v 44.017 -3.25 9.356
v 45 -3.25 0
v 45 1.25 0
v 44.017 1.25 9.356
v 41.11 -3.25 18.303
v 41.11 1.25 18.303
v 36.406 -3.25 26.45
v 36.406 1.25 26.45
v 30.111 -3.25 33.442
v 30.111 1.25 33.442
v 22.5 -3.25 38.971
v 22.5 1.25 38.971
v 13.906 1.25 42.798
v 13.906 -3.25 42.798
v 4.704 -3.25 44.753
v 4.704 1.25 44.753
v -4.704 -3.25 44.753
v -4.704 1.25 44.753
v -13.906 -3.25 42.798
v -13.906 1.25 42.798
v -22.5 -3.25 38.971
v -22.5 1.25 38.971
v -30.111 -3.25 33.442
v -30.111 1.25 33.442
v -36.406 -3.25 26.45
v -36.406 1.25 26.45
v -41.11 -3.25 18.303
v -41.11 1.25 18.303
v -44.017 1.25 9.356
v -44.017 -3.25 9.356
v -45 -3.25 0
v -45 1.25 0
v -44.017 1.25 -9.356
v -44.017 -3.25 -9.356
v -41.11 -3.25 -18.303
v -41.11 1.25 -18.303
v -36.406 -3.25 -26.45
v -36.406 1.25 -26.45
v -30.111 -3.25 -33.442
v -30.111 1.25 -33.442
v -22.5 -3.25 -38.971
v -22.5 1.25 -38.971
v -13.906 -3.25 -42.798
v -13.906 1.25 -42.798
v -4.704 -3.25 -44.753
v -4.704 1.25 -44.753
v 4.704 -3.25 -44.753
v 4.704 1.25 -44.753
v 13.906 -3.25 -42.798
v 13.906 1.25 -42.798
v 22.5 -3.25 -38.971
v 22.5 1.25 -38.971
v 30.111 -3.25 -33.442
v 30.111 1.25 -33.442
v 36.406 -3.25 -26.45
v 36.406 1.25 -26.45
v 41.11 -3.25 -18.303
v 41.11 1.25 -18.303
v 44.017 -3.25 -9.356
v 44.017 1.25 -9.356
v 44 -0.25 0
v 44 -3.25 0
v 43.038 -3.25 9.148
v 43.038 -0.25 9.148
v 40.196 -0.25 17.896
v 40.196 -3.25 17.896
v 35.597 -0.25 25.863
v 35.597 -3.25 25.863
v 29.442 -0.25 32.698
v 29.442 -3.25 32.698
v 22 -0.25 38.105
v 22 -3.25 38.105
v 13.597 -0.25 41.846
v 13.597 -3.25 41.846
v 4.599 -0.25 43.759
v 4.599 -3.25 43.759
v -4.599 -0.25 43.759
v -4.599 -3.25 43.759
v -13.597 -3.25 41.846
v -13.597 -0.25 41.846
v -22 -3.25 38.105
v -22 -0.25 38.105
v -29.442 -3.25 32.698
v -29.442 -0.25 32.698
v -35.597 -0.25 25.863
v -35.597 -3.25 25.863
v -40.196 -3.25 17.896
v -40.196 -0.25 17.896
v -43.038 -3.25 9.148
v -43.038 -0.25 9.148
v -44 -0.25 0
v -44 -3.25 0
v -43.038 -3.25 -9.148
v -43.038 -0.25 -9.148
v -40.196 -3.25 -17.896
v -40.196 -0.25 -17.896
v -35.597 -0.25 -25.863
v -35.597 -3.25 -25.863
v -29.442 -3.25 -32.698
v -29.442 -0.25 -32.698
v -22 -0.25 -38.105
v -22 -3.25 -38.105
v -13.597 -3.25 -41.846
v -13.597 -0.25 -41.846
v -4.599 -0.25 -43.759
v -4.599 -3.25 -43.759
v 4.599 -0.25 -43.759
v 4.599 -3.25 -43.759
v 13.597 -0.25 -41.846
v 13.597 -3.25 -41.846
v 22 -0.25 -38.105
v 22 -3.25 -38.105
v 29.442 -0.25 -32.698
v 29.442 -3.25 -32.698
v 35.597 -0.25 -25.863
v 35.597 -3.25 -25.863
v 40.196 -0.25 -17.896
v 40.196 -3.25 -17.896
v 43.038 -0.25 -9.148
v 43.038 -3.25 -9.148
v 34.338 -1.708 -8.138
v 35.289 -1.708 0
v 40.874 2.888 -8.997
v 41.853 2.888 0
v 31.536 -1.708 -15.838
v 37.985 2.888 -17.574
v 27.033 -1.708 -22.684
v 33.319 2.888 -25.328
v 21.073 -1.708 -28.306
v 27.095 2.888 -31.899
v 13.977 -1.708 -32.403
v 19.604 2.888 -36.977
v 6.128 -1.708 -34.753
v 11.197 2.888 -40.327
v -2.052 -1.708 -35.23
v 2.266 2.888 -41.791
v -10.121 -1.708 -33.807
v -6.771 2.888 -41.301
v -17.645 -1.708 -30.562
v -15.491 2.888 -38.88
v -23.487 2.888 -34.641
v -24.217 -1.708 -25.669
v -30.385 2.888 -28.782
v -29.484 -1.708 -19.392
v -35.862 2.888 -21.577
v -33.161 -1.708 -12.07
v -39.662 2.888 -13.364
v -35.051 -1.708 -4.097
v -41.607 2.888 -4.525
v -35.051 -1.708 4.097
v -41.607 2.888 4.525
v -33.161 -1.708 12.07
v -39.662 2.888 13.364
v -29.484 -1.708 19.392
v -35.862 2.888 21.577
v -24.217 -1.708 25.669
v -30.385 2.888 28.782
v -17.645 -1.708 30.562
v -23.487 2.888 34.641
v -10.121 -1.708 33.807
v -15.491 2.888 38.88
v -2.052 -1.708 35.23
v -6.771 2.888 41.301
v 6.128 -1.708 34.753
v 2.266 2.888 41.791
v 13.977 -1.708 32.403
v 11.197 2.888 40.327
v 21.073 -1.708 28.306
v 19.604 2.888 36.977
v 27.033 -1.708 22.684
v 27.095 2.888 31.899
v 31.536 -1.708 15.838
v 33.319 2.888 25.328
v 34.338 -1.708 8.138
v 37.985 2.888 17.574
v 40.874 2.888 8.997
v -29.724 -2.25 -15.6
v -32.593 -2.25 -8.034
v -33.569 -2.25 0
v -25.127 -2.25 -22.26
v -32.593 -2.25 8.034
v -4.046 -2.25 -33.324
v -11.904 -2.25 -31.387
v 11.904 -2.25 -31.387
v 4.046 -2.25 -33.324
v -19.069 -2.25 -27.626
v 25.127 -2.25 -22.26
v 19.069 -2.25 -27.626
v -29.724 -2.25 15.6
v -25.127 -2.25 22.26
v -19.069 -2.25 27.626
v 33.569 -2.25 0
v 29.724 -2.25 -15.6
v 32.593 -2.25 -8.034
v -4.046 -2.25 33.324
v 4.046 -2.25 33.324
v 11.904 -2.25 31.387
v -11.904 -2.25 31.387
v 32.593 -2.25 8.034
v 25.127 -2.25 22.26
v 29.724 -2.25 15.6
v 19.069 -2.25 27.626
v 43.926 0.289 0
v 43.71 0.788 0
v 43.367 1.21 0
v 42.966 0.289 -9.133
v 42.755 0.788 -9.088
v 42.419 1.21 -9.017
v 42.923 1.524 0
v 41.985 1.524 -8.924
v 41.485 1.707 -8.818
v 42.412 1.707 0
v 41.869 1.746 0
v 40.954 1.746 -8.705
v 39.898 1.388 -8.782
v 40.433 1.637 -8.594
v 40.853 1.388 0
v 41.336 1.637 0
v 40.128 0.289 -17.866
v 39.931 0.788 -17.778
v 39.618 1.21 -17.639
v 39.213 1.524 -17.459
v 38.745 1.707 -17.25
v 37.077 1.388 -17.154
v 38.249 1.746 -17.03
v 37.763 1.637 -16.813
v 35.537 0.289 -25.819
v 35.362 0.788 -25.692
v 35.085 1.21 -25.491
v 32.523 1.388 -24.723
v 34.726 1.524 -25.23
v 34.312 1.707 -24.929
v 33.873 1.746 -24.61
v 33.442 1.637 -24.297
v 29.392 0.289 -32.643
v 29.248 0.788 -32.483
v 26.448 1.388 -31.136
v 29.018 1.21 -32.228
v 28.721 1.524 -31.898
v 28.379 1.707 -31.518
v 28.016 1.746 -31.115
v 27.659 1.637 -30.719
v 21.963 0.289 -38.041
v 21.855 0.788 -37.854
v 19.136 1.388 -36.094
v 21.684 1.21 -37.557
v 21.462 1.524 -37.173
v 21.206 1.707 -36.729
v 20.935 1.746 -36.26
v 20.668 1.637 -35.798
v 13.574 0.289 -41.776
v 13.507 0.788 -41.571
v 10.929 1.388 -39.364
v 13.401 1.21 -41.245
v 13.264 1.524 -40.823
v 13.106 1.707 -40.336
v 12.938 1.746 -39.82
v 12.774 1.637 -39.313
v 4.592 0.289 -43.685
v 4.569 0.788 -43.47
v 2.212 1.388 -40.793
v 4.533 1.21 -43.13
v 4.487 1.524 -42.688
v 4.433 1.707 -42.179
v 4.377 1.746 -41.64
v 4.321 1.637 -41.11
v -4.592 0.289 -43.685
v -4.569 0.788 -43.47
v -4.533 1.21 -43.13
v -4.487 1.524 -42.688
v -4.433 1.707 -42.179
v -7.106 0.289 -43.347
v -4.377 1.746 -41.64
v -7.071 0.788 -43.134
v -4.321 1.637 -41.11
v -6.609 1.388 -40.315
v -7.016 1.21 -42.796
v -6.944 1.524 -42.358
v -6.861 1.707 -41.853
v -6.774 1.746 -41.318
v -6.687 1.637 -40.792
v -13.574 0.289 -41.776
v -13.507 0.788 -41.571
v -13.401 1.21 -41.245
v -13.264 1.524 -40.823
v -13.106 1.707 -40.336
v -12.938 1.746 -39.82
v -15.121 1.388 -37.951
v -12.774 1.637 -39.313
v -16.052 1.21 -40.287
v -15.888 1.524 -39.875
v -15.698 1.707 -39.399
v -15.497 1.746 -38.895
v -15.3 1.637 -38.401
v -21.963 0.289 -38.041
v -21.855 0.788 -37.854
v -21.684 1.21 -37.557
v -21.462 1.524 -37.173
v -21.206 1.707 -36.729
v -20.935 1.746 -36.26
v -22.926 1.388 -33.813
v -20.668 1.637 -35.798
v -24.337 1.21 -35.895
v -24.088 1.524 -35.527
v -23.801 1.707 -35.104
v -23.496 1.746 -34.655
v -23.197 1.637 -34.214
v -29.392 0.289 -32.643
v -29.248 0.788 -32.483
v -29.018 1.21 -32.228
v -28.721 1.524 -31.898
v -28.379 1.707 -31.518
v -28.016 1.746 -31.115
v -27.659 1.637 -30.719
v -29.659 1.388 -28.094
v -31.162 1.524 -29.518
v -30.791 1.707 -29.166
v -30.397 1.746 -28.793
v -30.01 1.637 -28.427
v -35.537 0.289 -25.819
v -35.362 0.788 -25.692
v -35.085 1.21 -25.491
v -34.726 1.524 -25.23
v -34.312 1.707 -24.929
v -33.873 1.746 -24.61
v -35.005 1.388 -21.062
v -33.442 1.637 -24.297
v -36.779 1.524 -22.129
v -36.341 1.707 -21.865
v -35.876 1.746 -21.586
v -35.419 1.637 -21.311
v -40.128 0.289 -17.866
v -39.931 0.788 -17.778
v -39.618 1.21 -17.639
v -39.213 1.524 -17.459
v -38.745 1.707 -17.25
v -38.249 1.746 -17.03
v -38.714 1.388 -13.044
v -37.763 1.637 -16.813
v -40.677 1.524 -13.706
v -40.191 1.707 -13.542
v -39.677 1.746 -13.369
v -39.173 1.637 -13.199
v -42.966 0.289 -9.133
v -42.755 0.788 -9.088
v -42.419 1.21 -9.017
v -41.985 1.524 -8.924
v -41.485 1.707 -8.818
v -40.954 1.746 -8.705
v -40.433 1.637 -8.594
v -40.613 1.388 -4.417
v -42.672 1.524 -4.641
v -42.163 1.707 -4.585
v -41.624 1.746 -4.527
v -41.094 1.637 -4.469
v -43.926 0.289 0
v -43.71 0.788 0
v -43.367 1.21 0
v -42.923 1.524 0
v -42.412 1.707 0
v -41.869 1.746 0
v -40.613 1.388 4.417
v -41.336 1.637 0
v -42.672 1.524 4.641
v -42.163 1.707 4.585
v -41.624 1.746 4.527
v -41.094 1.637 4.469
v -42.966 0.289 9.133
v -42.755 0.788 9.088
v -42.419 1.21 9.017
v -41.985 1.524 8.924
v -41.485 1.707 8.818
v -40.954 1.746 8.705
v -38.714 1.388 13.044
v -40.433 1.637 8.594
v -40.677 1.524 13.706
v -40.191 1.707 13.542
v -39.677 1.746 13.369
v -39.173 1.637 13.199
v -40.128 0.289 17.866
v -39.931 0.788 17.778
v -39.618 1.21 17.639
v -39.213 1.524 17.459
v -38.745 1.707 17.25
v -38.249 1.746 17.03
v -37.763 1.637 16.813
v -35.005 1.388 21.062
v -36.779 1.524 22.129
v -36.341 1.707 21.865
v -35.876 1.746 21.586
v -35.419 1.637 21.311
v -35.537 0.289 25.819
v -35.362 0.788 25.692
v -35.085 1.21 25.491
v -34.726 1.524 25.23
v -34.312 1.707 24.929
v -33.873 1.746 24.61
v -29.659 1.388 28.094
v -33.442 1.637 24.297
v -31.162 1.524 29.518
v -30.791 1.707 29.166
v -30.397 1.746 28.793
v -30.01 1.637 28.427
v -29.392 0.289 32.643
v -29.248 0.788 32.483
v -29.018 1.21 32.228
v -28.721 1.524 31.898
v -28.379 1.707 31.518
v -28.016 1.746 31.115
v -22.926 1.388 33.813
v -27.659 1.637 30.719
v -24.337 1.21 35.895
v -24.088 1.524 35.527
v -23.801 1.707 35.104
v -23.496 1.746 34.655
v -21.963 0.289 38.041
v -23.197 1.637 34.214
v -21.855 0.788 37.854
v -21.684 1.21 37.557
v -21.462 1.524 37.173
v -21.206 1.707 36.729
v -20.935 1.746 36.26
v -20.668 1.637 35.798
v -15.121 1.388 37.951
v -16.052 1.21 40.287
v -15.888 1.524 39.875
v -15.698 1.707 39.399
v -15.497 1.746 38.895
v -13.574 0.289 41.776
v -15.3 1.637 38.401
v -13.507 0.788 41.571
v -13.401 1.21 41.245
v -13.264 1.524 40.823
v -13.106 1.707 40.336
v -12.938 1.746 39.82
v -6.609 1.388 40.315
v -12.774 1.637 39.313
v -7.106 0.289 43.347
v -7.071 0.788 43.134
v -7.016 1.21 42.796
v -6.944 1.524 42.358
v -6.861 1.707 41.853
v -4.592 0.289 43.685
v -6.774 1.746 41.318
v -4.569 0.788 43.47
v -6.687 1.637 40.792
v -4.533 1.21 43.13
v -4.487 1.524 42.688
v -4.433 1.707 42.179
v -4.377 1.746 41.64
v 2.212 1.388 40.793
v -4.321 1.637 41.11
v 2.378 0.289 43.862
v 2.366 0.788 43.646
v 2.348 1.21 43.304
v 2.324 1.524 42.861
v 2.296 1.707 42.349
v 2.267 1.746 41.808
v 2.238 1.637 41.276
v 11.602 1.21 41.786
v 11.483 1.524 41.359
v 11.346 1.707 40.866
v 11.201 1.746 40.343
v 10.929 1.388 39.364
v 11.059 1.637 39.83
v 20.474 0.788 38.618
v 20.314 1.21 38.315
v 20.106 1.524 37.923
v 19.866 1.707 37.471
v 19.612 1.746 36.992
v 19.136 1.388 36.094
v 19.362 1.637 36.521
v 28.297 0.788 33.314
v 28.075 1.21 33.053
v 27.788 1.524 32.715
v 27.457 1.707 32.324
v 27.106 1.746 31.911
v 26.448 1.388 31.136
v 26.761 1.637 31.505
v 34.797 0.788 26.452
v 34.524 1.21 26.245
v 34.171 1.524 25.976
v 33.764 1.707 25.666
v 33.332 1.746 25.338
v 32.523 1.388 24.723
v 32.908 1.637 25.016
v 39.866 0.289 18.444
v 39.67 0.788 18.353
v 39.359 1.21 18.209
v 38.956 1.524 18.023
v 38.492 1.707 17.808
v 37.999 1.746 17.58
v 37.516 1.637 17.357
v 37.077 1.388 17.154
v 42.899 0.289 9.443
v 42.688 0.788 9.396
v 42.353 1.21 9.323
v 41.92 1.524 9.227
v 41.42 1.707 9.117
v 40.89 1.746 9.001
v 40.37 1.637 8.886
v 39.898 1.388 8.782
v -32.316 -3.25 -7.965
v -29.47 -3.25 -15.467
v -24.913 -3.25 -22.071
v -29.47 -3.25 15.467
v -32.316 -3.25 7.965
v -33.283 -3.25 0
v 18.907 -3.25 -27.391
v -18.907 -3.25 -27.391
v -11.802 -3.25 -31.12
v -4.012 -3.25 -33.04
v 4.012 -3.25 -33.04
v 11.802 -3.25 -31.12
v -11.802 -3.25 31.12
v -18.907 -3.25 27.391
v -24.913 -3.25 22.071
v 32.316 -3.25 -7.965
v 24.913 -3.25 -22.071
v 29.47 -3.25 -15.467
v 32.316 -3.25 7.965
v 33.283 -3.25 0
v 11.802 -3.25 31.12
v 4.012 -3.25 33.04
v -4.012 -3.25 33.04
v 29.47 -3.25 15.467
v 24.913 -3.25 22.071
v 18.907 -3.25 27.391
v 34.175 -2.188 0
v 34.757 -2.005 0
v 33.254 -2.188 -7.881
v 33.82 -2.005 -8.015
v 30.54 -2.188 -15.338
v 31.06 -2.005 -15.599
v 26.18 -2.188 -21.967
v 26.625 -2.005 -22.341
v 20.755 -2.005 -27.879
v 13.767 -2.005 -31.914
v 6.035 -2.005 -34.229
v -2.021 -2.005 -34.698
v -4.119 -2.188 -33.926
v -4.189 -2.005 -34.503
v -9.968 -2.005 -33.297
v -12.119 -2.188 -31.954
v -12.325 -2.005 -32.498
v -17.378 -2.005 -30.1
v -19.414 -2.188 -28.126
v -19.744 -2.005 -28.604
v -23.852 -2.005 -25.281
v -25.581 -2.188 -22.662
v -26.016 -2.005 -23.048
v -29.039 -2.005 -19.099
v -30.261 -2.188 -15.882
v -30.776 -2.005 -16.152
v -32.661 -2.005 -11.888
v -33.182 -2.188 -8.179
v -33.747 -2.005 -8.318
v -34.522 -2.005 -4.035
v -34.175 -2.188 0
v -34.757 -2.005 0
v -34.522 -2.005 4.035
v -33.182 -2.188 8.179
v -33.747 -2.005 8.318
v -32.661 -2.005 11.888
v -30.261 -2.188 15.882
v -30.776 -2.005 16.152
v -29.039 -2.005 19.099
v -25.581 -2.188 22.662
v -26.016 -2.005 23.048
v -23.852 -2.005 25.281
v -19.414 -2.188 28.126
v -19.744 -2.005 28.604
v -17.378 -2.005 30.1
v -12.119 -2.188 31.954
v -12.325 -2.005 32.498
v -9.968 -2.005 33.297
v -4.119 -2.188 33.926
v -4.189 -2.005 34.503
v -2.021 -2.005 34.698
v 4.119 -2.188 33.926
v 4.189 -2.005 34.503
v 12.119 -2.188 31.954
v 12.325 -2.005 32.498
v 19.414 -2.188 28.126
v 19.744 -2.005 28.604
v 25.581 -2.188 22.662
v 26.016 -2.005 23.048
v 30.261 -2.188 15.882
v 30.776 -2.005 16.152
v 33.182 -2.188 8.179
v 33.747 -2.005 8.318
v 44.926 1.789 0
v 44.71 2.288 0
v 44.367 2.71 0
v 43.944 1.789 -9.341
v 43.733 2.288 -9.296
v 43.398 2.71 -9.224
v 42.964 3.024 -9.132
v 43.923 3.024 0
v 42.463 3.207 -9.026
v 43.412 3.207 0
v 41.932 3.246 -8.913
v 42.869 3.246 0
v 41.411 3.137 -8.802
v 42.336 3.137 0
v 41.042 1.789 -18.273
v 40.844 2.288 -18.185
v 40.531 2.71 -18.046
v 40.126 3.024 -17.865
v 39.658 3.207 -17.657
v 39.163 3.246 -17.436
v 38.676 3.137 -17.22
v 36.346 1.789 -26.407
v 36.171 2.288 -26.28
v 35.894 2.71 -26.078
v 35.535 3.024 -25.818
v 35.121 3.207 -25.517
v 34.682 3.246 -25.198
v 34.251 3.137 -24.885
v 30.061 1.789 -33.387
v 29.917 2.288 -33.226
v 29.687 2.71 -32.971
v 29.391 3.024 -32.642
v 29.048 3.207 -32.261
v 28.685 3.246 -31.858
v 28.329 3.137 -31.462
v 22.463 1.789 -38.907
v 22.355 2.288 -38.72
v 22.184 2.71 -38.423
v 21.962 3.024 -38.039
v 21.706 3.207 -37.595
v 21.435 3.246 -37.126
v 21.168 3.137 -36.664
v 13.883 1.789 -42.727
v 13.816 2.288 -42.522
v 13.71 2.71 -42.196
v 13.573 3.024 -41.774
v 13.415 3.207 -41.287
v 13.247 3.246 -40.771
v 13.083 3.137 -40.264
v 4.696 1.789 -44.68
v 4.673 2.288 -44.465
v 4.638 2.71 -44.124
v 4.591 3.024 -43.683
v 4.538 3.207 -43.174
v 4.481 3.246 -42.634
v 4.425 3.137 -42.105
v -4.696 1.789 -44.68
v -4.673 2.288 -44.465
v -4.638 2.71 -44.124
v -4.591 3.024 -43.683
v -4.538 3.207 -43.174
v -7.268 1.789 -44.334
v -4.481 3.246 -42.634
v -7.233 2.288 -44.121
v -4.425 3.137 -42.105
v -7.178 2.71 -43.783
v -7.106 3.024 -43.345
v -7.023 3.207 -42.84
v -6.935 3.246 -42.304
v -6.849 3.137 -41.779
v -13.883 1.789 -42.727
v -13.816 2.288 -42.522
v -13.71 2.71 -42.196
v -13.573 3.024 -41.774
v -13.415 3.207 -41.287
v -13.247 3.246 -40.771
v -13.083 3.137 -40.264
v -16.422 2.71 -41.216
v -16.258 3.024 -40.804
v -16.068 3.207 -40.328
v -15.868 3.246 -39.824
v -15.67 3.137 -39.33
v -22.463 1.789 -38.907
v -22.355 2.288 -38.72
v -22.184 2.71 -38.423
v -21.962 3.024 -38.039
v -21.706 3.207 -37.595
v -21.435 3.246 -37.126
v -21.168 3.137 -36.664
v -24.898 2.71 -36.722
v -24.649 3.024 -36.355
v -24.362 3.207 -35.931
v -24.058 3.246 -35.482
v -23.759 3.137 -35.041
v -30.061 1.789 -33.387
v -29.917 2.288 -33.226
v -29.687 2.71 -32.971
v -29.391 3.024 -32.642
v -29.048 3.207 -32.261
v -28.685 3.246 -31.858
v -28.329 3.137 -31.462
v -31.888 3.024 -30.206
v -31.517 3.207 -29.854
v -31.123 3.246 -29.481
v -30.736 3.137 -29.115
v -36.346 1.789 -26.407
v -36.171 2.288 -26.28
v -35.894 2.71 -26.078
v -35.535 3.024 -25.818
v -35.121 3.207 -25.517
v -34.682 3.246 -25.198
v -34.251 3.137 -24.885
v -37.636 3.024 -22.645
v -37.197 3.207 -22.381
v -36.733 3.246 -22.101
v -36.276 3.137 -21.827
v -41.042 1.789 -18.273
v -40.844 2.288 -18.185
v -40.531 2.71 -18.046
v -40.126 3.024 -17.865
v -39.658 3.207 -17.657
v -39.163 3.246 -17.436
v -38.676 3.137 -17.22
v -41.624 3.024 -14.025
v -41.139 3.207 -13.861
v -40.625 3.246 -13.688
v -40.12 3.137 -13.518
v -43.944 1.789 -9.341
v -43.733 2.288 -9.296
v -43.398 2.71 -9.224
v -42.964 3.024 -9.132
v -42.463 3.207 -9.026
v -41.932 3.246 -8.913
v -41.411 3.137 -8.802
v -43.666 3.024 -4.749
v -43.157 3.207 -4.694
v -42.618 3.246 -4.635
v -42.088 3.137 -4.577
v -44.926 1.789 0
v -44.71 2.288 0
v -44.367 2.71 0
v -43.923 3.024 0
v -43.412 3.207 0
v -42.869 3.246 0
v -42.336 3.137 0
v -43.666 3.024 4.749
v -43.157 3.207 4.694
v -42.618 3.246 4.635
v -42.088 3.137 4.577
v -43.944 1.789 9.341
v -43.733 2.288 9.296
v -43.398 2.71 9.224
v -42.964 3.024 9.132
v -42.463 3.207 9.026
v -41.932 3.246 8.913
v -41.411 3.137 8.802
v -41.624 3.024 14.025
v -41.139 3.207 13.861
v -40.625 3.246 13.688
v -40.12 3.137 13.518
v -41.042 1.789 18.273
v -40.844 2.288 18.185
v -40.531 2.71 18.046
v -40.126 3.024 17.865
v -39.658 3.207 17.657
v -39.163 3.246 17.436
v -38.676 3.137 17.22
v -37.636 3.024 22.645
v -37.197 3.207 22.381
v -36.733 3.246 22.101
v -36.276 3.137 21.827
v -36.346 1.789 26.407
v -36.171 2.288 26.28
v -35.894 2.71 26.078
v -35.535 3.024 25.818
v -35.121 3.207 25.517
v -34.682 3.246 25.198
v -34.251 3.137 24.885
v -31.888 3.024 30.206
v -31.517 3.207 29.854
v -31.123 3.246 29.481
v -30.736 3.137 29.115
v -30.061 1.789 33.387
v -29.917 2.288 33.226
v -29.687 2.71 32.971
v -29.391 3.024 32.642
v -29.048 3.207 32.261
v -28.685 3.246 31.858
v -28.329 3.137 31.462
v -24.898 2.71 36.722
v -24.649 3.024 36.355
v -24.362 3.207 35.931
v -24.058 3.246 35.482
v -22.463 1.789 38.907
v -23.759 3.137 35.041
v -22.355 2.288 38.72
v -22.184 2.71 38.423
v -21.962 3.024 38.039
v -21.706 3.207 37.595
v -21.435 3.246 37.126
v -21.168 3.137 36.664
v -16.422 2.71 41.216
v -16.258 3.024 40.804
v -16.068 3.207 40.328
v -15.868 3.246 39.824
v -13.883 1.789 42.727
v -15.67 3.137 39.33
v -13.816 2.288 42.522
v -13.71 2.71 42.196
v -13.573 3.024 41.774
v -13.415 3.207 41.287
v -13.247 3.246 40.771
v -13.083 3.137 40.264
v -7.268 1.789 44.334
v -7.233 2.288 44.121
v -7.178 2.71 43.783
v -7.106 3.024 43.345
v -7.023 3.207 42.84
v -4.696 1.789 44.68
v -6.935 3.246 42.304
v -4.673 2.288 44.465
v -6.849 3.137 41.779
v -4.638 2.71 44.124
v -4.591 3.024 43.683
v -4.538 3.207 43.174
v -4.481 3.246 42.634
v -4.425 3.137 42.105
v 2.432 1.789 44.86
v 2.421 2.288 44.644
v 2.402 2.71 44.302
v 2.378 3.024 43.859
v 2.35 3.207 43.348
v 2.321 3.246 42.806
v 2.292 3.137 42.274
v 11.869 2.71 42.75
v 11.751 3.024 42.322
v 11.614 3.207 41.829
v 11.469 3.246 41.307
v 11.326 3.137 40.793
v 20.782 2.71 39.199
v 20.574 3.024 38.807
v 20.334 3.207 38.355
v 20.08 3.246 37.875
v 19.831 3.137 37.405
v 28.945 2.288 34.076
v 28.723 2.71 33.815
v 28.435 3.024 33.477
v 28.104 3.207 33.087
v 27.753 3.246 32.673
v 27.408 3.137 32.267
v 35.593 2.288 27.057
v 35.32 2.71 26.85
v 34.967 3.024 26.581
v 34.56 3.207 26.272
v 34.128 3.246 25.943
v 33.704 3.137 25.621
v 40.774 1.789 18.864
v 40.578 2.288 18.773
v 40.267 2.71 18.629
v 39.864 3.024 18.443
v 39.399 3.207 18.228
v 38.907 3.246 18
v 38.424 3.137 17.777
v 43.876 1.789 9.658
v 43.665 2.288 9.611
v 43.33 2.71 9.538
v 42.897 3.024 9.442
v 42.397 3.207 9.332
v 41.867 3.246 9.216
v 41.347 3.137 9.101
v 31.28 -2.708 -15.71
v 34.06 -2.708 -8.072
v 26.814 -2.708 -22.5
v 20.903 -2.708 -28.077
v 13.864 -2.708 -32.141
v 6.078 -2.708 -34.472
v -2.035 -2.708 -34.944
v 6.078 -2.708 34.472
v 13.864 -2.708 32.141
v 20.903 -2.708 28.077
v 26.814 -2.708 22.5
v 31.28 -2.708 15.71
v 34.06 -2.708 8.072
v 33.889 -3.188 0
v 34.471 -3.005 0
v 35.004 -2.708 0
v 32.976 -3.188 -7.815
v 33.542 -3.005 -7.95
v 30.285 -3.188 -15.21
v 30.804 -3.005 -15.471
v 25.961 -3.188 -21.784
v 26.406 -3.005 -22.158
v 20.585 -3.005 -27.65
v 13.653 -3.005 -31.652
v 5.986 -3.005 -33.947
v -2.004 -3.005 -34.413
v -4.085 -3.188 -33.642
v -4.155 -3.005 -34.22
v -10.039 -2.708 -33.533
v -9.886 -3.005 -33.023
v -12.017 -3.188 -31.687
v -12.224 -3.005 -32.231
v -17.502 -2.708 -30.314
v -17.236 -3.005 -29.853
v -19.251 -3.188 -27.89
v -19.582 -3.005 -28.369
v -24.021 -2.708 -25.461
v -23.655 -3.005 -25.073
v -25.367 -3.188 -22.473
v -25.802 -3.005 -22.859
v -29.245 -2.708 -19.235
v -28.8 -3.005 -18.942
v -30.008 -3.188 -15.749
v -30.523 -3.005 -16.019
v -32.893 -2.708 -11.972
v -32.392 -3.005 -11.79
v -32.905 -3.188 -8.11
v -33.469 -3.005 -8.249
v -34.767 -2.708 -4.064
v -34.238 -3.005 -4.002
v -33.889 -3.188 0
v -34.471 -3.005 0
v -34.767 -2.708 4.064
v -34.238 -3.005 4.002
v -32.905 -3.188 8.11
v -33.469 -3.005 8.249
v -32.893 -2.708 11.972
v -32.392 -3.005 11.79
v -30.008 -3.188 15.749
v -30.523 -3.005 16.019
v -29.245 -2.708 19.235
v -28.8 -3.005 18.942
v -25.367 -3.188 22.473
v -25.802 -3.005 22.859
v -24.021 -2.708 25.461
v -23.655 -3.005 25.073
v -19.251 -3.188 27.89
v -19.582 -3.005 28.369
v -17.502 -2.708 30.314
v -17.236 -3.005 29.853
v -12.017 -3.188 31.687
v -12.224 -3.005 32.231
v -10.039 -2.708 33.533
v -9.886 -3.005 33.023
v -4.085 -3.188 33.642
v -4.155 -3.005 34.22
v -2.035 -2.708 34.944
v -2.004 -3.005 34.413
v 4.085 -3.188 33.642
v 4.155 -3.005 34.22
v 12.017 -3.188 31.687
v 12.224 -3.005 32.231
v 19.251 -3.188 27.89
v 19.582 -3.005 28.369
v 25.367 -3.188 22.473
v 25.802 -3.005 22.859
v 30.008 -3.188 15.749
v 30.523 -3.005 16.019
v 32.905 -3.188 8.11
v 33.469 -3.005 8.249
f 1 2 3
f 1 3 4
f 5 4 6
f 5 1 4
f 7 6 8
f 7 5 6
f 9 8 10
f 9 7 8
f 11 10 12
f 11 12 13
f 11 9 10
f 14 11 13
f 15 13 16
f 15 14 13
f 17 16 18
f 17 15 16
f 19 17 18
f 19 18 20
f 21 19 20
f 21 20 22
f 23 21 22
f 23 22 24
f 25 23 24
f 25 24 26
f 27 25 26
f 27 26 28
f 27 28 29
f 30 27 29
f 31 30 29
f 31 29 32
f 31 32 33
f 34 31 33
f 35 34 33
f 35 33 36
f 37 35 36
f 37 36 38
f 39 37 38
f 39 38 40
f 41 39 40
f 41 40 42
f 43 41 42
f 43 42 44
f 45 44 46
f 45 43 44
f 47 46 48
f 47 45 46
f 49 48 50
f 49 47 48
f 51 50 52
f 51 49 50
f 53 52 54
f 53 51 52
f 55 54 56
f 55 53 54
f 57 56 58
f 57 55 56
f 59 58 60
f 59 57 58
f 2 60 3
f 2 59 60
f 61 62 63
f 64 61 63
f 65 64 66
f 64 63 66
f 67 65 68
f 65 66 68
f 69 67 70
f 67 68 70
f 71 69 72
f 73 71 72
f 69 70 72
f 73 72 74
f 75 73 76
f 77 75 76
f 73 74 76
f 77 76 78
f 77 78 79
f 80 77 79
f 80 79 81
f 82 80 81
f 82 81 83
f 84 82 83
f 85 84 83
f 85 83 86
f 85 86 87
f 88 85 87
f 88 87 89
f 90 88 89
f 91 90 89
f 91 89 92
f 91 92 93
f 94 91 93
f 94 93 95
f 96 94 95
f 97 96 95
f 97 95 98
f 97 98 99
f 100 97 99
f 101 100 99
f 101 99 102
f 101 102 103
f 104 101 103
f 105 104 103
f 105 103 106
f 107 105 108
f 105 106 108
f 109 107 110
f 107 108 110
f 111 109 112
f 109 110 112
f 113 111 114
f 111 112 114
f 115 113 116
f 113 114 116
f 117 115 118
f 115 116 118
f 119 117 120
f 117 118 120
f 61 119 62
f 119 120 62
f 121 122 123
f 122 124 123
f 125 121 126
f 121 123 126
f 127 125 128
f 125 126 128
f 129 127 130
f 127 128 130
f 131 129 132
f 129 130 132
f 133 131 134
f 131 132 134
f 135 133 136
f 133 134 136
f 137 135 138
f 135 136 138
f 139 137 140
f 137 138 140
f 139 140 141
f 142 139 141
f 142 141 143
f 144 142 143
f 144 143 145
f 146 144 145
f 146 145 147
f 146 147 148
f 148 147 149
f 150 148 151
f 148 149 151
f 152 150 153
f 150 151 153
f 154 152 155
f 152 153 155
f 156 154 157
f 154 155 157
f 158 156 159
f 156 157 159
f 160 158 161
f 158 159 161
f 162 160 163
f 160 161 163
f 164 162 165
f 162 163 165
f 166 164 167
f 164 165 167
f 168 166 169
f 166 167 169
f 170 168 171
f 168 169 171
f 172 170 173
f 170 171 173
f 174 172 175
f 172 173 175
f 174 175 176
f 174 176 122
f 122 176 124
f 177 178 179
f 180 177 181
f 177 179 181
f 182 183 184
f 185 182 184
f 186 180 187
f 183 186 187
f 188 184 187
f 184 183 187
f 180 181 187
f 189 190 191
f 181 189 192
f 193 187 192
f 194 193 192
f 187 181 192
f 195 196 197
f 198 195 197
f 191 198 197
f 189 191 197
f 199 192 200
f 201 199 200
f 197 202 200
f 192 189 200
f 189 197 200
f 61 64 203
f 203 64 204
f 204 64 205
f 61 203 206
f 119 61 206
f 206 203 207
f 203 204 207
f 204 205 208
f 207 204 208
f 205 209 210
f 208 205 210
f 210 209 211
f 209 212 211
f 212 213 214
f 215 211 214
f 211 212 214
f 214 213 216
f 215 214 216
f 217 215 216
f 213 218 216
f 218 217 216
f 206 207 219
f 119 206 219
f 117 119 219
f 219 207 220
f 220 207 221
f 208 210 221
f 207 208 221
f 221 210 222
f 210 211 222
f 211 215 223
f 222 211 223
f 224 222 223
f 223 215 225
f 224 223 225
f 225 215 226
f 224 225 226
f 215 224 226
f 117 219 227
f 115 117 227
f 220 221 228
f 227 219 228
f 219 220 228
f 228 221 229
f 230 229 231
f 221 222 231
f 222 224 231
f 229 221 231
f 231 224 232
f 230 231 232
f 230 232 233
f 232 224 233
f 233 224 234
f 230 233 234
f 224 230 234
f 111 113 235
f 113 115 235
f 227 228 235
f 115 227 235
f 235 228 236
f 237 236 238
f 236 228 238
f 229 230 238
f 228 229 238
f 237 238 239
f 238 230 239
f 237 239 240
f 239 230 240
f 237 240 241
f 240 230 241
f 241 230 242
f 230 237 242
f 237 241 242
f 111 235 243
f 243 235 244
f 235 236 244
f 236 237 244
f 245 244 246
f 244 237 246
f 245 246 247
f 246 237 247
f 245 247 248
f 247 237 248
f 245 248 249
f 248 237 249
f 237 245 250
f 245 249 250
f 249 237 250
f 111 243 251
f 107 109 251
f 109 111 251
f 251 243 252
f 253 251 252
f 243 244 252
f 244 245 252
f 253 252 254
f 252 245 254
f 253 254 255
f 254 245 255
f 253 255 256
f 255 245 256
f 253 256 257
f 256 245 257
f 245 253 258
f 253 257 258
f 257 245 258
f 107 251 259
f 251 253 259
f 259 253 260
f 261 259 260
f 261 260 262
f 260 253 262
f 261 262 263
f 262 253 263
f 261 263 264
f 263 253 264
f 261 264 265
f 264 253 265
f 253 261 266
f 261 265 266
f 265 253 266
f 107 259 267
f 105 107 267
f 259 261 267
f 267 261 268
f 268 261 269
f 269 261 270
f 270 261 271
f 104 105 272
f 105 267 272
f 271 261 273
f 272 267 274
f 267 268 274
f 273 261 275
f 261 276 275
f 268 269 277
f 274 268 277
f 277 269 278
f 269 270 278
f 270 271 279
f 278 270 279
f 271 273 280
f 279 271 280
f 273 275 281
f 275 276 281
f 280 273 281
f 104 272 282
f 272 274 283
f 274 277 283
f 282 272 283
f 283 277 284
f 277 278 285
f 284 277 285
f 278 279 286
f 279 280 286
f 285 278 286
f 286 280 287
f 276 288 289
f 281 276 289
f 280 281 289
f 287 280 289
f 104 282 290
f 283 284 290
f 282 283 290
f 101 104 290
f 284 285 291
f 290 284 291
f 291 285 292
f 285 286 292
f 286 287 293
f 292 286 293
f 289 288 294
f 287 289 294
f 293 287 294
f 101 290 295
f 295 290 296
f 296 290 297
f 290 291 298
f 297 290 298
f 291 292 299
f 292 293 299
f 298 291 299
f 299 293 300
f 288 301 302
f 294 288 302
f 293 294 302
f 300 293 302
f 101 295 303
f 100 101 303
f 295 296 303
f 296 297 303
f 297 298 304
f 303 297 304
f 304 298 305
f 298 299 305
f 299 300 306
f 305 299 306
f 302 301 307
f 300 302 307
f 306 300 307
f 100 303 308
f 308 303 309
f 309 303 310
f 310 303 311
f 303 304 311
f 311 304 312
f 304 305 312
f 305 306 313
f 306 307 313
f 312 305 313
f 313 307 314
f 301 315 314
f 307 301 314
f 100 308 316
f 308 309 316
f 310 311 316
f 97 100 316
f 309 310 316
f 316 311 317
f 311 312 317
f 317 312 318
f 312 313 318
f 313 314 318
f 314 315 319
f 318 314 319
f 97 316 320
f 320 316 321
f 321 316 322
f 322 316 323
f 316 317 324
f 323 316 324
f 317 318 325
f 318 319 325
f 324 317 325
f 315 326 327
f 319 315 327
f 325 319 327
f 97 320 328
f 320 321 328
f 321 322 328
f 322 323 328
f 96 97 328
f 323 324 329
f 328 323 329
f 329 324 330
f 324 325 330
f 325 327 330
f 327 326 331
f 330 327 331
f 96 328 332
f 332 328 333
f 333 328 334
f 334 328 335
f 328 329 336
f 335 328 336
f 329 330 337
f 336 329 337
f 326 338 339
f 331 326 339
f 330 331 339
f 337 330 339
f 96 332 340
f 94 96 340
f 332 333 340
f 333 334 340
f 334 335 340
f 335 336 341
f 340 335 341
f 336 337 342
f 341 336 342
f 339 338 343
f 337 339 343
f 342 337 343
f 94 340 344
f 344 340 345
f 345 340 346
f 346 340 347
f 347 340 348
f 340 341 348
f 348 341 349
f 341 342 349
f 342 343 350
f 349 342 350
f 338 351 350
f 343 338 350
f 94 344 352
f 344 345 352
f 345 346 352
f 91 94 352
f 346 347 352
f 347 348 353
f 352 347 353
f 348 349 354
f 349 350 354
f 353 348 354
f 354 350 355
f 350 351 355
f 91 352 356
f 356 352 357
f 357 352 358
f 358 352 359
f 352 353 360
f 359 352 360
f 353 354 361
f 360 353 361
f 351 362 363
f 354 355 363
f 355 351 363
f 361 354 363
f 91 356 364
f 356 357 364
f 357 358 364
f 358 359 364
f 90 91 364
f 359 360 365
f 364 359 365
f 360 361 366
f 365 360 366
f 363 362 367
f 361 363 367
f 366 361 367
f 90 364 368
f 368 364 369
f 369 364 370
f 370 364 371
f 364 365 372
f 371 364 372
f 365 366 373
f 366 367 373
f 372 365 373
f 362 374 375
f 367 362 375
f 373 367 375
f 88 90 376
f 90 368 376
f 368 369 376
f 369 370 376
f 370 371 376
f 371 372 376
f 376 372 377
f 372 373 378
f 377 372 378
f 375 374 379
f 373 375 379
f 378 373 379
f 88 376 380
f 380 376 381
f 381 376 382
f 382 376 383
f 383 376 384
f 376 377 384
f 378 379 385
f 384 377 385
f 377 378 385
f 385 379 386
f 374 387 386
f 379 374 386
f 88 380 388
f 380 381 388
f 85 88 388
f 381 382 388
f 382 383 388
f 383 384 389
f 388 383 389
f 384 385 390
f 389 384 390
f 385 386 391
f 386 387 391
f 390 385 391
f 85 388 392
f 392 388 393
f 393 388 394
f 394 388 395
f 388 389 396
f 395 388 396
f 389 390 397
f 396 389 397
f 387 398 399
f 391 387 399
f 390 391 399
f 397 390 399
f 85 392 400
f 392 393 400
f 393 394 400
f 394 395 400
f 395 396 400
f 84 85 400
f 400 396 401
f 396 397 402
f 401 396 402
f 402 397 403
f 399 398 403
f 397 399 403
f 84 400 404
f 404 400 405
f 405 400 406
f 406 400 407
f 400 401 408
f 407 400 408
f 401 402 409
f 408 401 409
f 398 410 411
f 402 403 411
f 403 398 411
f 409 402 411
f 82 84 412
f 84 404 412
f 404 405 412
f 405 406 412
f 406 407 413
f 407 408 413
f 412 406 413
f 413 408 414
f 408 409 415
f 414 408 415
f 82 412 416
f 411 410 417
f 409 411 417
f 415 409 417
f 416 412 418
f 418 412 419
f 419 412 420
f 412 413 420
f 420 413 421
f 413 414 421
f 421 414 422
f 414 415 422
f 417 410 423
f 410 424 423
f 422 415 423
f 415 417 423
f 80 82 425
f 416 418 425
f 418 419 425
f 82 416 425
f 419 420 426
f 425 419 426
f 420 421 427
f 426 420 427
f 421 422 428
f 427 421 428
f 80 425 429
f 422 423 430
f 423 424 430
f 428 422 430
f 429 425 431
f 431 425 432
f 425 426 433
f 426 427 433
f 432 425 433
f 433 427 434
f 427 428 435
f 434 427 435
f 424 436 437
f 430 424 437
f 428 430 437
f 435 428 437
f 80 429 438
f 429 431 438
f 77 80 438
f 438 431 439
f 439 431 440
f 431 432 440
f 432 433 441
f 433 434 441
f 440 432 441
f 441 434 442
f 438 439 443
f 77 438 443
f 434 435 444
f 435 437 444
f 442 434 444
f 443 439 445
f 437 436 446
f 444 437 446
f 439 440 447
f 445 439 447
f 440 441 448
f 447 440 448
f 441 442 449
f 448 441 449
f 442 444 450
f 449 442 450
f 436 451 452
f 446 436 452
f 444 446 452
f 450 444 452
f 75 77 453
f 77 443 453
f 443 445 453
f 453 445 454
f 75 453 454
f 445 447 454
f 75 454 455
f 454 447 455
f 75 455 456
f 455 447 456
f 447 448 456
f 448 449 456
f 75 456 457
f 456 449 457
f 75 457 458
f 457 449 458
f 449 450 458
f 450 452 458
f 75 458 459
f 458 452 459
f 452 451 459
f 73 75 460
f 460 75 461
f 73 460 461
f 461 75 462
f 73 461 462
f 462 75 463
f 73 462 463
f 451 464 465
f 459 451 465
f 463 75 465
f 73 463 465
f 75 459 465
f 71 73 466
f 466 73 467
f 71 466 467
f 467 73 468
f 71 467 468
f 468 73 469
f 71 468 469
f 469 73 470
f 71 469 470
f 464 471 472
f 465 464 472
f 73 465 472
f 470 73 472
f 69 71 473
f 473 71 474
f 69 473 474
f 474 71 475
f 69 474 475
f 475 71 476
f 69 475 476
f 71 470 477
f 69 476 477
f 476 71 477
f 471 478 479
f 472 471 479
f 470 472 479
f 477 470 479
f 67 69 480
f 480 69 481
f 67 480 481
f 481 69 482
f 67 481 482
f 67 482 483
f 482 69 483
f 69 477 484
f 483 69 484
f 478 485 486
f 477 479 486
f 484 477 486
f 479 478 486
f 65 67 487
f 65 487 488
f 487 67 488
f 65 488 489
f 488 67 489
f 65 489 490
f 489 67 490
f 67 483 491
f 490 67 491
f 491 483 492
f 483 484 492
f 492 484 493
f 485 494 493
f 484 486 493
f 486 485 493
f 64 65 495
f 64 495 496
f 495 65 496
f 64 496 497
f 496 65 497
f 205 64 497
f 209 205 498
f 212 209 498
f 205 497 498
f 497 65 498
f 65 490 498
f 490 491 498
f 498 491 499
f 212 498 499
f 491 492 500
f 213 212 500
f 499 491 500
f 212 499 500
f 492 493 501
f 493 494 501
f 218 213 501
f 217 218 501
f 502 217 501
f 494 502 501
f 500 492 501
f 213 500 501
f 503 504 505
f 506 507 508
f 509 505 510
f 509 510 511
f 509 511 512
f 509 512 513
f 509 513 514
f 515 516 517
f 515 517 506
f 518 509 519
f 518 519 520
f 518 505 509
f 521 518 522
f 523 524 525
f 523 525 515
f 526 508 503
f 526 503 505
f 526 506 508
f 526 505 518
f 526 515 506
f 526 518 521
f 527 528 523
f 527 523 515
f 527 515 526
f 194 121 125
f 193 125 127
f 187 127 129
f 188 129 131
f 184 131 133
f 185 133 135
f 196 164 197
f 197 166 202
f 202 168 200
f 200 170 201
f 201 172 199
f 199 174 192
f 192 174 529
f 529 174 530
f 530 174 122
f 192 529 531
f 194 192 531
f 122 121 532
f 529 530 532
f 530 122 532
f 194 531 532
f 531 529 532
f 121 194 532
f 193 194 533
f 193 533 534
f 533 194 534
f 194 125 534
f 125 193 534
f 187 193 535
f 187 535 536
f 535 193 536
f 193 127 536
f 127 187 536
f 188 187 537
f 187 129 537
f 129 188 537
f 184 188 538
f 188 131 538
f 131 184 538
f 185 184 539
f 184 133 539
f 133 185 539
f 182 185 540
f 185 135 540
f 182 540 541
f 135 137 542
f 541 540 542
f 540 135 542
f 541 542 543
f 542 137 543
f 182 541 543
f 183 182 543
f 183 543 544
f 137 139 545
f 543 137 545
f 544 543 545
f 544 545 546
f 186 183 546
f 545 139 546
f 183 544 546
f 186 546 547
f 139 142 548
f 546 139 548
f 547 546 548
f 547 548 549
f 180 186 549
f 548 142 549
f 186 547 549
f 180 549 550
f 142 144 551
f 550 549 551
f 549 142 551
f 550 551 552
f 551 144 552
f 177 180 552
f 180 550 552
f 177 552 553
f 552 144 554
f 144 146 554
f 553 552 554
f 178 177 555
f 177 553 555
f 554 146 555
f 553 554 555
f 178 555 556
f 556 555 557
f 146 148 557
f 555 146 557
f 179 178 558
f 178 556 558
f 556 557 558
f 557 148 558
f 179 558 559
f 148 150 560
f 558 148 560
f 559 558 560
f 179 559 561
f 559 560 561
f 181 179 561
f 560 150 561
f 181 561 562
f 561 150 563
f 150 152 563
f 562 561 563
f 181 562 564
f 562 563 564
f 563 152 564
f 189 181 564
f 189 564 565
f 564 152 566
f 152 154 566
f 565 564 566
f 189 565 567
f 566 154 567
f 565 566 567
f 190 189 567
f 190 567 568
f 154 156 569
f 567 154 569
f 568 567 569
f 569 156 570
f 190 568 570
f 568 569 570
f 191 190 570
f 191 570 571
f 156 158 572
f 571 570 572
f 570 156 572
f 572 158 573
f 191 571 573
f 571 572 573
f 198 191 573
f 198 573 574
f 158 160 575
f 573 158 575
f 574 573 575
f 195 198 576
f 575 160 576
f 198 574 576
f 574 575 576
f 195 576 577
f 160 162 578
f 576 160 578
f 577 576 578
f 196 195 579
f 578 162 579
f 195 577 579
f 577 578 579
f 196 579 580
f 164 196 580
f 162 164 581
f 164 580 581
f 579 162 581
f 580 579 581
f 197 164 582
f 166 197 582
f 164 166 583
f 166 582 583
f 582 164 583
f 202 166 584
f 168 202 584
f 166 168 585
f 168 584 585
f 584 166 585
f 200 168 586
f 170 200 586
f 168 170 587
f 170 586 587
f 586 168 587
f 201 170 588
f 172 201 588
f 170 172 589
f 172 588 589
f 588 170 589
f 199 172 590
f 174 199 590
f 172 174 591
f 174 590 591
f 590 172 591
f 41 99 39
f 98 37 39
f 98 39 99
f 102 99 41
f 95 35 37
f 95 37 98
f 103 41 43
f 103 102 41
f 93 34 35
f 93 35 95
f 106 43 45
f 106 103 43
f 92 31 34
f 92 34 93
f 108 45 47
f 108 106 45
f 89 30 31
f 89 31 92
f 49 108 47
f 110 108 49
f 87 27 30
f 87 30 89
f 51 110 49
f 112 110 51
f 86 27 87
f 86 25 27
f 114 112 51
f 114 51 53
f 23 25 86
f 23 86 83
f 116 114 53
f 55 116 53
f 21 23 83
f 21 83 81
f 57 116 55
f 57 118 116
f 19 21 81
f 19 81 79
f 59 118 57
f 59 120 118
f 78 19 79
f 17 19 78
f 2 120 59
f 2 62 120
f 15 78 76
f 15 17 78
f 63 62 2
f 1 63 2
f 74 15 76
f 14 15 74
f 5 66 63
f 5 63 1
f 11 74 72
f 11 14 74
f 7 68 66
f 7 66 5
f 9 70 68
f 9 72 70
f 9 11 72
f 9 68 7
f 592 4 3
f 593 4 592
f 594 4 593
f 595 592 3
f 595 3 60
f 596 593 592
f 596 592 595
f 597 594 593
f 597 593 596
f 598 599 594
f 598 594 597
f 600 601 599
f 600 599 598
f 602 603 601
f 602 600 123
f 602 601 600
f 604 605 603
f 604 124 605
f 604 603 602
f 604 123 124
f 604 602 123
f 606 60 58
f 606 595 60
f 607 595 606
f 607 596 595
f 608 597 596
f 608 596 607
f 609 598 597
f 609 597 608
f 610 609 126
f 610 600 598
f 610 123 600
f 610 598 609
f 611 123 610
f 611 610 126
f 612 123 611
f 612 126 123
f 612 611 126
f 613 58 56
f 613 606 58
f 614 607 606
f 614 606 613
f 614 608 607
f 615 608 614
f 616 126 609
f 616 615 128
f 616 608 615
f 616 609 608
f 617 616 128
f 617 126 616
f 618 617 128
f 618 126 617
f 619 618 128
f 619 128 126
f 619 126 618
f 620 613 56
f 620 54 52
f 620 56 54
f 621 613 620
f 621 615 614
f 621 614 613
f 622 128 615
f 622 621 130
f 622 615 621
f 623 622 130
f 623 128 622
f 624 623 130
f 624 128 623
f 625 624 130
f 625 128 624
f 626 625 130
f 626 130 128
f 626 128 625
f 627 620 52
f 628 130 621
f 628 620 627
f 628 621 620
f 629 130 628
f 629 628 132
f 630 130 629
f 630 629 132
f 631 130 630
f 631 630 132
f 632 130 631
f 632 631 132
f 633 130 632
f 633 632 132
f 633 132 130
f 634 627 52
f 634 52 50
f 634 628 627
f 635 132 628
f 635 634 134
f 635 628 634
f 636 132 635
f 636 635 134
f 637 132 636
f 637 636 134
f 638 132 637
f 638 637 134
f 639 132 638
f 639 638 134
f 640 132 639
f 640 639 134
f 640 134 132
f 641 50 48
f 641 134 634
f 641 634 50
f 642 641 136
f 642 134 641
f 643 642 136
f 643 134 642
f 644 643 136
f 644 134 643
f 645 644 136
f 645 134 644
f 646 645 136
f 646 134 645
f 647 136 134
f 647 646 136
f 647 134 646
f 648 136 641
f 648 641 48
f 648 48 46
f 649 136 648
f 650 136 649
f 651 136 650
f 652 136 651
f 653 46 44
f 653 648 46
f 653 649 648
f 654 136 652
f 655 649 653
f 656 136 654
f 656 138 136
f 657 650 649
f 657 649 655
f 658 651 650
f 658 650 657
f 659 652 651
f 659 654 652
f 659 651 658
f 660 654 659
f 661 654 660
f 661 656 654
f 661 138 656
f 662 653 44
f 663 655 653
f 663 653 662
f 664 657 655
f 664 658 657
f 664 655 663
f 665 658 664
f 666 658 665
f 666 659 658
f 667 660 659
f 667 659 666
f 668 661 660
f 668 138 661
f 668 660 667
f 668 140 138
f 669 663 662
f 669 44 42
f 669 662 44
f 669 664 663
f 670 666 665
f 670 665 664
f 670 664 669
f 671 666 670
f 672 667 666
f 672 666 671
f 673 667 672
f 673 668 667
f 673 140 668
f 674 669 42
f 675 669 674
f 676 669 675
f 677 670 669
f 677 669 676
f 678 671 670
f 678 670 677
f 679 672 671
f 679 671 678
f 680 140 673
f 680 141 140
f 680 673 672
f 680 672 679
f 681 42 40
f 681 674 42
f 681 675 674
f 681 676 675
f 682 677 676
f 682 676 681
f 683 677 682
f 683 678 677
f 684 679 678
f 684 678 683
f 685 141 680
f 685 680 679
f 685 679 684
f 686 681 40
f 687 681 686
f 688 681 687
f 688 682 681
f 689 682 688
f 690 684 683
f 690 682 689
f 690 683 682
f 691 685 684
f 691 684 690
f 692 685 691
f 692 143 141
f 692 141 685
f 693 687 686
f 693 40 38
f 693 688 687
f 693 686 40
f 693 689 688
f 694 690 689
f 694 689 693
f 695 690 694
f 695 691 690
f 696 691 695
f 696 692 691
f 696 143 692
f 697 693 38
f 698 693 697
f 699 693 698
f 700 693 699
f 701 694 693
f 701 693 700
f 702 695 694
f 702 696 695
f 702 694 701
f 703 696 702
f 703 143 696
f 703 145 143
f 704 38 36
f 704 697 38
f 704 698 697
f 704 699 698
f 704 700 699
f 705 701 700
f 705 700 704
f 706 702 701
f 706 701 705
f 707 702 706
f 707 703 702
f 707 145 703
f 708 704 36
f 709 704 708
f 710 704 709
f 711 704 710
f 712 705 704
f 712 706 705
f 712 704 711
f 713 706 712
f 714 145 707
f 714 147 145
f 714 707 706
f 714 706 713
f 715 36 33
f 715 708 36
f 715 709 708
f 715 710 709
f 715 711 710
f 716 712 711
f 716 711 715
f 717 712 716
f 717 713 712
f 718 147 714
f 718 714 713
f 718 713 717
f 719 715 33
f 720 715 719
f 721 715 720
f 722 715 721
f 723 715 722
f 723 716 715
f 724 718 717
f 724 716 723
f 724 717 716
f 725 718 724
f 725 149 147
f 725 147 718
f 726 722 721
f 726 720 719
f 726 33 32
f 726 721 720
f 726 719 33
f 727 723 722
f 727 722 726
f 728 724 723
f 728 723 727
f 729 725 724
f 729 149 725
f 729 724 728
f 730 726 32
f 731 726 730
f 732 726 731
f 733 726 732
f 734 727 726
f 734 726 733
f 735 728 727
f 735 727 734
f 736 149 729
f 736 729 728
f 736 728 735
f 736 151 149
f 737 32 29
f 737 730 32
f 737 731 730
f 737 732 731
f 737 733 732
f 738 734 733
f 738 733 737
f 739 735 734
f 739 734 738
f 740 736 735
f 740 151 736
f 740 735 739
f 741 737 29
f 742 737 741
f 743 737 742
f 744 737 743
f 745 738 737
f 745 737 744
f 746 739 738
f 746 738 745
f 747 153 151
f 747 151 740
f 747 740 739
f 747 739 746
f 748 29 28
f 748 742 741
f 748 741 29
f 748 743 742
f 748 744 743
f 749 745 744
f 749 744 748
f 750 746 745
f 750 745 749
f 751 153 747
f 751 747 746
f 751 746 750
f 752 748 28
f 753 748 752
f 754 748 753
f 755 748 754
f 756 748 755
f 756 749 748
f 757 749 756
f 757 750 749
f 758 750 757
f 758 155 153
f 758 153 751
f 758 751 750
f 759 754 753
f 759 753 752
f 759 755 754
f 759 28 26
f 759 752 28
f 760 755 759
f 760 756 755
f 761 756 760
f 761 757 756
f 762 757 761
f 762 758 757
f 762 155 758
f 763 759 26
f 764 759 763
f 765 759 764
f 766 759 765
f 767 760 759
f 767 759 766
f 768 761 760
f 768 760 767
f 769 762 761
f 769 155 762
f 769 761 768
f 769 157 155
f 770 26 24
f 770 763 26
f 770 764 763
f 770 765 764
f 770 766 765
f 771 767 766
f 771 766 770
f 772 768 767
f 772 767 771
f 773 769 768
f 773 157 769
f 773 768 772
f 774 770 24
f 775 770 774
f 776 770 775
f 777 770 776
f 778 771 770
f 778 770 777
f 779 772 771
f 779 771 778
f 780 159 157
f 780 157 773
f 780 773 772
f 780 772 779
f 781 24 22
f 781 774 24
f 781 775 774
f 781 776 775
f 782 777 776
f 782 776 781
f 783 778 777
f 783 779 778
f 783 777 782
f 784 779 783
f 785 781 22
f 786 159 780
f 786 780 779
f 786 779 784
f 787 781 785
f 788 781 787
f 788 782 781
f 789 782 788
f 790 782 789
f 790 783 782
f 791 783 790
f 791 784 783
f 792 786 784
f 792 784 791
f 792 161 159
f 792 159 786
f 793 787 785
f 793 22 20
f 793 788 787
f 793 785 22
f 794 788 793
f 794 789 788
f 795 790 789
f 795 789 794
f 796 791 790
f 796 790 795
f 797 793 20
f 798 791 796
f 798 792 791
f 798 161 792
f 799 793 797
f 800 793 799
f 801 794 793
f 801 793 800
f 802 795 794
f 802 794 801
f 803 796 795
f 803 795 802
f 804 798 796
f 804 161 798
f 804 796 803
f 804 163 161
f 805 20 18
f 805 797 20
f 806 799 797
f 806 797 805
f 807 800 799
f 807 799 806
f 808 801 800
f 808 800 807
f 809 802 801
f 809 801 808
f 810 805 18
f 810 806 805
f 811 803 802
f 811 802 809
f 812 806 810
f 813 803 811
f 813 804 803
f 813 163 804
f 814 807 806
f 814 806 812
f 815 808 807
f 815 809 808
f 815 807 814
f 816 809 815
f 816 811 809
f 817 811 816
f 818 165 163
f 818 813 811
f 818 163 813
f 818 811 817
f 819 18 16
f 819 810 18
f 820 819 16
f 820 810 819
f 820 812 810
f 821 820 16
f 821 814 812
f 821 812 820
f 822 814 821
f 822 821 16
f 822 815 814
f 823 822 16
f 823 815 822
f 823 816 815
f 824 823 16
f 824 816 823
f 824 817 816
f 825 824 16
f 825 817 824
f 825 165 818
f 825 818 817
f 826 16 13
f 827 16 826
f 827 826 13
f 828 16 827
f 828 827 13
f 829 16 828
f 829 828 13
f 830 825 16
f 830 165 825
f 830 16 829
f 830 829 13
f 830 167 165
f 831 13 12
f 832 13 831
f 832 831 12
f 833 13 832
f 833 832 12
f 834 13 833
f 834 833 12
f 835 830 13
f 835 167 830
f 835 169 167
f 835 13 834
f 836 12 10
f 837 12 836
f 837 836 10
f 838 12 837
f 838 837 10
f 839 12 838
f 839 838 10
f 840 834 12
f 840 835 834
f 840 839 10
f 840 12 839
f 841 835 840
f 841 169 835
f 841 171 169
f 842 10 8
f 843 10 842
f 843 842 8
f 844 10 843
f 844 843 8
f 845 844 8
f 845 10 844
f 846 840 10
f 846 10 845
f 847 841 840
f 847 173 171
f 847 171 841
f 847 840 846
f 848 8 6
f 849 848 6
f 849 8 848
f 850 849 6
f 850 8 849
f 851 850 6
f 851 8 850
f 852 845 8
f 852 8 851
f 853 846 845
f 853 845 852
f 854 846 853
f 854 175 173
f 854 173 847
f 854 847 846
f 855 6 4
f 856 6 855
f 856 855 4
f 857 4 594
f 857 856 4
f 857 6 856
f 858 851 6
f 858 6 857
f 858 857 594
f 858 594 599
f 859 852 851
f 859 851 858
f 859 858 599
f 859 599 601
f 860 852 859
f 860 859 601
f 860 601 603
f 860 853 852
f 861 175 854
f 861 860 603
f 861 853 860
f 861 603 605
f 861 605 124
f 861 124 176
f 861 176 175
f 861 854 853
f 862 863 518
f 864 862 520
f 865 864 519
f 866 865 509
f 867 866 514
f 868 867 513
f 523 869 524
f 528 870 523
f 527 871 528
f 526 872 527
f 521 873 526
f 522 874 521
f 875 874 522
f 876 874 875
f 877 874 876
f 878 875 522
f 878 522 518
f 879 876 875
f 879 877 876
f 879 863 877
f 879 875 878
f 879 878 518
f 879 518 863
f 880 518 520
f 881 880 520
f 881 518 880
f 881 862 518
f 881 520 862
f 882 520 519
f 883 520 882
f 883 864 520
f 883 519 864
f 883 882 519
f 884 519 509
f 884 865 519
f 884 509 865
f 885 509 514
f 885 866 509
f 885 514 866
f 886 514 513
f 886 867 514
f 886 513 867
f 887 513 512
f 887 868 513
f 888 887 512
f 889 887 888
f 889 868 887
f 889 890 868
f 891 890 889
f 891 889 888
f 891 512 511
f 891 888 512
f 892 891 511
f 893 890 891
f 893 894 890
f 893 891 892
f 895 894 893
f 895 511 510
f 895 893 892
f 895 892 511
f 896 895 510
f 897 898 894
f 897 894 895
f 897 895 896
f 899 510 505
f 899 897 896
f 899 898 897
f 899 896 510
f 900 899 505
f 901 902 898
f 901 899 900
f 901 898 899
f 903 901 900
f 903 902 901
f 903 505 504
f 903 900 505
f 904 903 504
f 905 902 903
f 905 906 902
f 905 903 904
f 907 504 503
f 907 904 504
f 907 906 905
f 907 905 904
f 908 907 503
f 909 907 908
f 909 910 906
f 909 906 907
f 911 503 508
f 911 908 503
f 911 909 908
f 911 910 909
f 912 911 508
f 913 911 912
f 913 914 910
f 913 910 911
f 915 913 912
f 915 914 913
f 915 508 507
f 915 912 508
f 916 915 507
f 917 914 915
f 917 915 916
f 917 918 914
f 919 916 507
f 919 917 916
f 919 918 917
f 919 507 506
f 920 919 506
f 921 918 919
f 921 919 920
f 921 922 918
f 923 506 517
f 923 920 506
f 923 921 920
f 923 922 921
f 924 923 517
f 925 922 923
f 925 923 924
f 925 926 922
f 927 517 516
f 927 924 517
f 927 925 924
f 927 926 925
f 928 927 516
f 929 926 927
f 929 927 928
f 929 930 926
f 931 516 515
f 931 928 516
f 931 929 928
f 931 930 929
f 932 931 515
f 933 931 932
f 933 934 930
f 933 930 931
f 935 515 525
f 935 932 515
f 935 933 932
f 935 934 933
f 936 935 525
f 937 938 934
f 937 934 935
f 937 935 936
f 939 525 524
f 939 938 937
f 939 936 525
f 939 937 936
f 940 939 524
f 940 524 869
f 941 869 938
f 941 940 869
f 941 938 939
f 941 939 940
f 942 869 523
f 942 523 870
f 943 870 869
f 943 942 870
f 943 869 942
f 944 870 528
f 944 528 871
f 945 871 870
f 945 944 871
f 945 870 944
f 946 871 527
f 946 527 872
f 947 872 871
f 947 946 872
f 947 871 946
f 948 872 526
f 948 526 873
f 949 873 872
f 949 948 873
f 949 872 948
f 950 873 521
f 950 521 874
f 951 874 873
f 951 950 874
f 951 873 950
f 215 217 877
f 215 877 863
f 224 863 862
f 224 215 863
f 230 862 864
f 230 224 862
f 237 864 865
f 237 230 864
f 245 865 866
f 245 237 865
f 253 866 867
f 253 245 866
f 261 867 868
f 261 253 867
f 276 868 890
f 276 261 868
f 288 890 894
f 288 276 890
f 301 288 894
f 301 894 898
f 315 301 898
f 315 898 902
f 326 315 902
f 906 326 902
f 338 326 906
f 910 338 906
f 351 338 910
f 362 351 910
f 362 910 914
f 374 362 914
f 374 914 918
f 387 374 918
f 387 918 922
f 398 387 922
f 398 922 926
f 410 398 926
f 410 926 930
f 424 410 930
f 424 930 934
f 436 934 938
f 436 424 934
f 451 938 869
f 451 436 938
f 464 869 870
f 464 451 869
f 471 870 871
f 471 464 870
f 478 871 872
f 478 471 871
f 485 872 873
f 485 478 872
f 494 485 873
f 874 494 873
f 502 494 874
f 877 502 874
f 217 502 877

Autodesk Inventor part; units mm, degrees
ref_plane "YZ Plane" through (0, 0, 0) normal (1, 0, 0) x (0, 1, 0)
ref_plane "XZ Plane" through (0, 0, 0) normal (0, 1, 0) x (-1, 0, 0)
ref_plane "XY Plane" through (0, 0, 0) normal (0, 0, 1) x (1, 0, 0)
sketch "Эскиз1" plane through (0, 0, 0) normal (0, 0, 1) x (1, 0, 0)
  line L0 (0, 3.25) -> (0, -3.25)
  line L1 (0, -2.25) -> (33.5687, -2.25)
  line L2 (35.2894, -1.7075) -> (41.8528, 2.8883)
  line L3 (45, 1.25) -> (45, -3.25)
  arc A0 (33.5687, -2.25) -> (35.2894, -1.7075) centre (33.5687, 0.75) ccw
  arc A1 (45, 1.25) -> (41.8528, 2.8883) centre (43, 1.25) ccw
  line L4 (0, 3.25) -> (45, 3.25) construction
  line L5 (0, -3.25) -> (33.2828, -3.25)
  line L6 (35.0035, -2.7075) -> (40.8528, 1.3883)
  line L7 (44, -0.25) -> (44, -3.25)
  arc A2 (33.2828, -3.25) -> (35.0035, -2.7075) centre (33.2828, -0.25) ccw
  arc A3 (44, -0.25) -> (40.8528, 1.3883) centre (42, -0.25) ccw
  line L8 (44, -3.25) -> (45, -3.25)
  point P0 (0, 0)
  point P1 (0, 0)
  dimension "d0" = 6.5
  dimension "d1" = 1
  dimension "d2" = 3
  dimension "d3" = 55
  dimension "d4" = 90
  dimension "d5" = 2
  dimension "d6" = 55
  dimension "d7" = 3
  dimension "d8" = 2
  dimension "d9" = 1
revolve "Вращение1" add sketch "Эскиз1" angle 360 about axis through (0, 3.25, 0) along (0, -1, 0)
properties part number "77. Заглушка"
